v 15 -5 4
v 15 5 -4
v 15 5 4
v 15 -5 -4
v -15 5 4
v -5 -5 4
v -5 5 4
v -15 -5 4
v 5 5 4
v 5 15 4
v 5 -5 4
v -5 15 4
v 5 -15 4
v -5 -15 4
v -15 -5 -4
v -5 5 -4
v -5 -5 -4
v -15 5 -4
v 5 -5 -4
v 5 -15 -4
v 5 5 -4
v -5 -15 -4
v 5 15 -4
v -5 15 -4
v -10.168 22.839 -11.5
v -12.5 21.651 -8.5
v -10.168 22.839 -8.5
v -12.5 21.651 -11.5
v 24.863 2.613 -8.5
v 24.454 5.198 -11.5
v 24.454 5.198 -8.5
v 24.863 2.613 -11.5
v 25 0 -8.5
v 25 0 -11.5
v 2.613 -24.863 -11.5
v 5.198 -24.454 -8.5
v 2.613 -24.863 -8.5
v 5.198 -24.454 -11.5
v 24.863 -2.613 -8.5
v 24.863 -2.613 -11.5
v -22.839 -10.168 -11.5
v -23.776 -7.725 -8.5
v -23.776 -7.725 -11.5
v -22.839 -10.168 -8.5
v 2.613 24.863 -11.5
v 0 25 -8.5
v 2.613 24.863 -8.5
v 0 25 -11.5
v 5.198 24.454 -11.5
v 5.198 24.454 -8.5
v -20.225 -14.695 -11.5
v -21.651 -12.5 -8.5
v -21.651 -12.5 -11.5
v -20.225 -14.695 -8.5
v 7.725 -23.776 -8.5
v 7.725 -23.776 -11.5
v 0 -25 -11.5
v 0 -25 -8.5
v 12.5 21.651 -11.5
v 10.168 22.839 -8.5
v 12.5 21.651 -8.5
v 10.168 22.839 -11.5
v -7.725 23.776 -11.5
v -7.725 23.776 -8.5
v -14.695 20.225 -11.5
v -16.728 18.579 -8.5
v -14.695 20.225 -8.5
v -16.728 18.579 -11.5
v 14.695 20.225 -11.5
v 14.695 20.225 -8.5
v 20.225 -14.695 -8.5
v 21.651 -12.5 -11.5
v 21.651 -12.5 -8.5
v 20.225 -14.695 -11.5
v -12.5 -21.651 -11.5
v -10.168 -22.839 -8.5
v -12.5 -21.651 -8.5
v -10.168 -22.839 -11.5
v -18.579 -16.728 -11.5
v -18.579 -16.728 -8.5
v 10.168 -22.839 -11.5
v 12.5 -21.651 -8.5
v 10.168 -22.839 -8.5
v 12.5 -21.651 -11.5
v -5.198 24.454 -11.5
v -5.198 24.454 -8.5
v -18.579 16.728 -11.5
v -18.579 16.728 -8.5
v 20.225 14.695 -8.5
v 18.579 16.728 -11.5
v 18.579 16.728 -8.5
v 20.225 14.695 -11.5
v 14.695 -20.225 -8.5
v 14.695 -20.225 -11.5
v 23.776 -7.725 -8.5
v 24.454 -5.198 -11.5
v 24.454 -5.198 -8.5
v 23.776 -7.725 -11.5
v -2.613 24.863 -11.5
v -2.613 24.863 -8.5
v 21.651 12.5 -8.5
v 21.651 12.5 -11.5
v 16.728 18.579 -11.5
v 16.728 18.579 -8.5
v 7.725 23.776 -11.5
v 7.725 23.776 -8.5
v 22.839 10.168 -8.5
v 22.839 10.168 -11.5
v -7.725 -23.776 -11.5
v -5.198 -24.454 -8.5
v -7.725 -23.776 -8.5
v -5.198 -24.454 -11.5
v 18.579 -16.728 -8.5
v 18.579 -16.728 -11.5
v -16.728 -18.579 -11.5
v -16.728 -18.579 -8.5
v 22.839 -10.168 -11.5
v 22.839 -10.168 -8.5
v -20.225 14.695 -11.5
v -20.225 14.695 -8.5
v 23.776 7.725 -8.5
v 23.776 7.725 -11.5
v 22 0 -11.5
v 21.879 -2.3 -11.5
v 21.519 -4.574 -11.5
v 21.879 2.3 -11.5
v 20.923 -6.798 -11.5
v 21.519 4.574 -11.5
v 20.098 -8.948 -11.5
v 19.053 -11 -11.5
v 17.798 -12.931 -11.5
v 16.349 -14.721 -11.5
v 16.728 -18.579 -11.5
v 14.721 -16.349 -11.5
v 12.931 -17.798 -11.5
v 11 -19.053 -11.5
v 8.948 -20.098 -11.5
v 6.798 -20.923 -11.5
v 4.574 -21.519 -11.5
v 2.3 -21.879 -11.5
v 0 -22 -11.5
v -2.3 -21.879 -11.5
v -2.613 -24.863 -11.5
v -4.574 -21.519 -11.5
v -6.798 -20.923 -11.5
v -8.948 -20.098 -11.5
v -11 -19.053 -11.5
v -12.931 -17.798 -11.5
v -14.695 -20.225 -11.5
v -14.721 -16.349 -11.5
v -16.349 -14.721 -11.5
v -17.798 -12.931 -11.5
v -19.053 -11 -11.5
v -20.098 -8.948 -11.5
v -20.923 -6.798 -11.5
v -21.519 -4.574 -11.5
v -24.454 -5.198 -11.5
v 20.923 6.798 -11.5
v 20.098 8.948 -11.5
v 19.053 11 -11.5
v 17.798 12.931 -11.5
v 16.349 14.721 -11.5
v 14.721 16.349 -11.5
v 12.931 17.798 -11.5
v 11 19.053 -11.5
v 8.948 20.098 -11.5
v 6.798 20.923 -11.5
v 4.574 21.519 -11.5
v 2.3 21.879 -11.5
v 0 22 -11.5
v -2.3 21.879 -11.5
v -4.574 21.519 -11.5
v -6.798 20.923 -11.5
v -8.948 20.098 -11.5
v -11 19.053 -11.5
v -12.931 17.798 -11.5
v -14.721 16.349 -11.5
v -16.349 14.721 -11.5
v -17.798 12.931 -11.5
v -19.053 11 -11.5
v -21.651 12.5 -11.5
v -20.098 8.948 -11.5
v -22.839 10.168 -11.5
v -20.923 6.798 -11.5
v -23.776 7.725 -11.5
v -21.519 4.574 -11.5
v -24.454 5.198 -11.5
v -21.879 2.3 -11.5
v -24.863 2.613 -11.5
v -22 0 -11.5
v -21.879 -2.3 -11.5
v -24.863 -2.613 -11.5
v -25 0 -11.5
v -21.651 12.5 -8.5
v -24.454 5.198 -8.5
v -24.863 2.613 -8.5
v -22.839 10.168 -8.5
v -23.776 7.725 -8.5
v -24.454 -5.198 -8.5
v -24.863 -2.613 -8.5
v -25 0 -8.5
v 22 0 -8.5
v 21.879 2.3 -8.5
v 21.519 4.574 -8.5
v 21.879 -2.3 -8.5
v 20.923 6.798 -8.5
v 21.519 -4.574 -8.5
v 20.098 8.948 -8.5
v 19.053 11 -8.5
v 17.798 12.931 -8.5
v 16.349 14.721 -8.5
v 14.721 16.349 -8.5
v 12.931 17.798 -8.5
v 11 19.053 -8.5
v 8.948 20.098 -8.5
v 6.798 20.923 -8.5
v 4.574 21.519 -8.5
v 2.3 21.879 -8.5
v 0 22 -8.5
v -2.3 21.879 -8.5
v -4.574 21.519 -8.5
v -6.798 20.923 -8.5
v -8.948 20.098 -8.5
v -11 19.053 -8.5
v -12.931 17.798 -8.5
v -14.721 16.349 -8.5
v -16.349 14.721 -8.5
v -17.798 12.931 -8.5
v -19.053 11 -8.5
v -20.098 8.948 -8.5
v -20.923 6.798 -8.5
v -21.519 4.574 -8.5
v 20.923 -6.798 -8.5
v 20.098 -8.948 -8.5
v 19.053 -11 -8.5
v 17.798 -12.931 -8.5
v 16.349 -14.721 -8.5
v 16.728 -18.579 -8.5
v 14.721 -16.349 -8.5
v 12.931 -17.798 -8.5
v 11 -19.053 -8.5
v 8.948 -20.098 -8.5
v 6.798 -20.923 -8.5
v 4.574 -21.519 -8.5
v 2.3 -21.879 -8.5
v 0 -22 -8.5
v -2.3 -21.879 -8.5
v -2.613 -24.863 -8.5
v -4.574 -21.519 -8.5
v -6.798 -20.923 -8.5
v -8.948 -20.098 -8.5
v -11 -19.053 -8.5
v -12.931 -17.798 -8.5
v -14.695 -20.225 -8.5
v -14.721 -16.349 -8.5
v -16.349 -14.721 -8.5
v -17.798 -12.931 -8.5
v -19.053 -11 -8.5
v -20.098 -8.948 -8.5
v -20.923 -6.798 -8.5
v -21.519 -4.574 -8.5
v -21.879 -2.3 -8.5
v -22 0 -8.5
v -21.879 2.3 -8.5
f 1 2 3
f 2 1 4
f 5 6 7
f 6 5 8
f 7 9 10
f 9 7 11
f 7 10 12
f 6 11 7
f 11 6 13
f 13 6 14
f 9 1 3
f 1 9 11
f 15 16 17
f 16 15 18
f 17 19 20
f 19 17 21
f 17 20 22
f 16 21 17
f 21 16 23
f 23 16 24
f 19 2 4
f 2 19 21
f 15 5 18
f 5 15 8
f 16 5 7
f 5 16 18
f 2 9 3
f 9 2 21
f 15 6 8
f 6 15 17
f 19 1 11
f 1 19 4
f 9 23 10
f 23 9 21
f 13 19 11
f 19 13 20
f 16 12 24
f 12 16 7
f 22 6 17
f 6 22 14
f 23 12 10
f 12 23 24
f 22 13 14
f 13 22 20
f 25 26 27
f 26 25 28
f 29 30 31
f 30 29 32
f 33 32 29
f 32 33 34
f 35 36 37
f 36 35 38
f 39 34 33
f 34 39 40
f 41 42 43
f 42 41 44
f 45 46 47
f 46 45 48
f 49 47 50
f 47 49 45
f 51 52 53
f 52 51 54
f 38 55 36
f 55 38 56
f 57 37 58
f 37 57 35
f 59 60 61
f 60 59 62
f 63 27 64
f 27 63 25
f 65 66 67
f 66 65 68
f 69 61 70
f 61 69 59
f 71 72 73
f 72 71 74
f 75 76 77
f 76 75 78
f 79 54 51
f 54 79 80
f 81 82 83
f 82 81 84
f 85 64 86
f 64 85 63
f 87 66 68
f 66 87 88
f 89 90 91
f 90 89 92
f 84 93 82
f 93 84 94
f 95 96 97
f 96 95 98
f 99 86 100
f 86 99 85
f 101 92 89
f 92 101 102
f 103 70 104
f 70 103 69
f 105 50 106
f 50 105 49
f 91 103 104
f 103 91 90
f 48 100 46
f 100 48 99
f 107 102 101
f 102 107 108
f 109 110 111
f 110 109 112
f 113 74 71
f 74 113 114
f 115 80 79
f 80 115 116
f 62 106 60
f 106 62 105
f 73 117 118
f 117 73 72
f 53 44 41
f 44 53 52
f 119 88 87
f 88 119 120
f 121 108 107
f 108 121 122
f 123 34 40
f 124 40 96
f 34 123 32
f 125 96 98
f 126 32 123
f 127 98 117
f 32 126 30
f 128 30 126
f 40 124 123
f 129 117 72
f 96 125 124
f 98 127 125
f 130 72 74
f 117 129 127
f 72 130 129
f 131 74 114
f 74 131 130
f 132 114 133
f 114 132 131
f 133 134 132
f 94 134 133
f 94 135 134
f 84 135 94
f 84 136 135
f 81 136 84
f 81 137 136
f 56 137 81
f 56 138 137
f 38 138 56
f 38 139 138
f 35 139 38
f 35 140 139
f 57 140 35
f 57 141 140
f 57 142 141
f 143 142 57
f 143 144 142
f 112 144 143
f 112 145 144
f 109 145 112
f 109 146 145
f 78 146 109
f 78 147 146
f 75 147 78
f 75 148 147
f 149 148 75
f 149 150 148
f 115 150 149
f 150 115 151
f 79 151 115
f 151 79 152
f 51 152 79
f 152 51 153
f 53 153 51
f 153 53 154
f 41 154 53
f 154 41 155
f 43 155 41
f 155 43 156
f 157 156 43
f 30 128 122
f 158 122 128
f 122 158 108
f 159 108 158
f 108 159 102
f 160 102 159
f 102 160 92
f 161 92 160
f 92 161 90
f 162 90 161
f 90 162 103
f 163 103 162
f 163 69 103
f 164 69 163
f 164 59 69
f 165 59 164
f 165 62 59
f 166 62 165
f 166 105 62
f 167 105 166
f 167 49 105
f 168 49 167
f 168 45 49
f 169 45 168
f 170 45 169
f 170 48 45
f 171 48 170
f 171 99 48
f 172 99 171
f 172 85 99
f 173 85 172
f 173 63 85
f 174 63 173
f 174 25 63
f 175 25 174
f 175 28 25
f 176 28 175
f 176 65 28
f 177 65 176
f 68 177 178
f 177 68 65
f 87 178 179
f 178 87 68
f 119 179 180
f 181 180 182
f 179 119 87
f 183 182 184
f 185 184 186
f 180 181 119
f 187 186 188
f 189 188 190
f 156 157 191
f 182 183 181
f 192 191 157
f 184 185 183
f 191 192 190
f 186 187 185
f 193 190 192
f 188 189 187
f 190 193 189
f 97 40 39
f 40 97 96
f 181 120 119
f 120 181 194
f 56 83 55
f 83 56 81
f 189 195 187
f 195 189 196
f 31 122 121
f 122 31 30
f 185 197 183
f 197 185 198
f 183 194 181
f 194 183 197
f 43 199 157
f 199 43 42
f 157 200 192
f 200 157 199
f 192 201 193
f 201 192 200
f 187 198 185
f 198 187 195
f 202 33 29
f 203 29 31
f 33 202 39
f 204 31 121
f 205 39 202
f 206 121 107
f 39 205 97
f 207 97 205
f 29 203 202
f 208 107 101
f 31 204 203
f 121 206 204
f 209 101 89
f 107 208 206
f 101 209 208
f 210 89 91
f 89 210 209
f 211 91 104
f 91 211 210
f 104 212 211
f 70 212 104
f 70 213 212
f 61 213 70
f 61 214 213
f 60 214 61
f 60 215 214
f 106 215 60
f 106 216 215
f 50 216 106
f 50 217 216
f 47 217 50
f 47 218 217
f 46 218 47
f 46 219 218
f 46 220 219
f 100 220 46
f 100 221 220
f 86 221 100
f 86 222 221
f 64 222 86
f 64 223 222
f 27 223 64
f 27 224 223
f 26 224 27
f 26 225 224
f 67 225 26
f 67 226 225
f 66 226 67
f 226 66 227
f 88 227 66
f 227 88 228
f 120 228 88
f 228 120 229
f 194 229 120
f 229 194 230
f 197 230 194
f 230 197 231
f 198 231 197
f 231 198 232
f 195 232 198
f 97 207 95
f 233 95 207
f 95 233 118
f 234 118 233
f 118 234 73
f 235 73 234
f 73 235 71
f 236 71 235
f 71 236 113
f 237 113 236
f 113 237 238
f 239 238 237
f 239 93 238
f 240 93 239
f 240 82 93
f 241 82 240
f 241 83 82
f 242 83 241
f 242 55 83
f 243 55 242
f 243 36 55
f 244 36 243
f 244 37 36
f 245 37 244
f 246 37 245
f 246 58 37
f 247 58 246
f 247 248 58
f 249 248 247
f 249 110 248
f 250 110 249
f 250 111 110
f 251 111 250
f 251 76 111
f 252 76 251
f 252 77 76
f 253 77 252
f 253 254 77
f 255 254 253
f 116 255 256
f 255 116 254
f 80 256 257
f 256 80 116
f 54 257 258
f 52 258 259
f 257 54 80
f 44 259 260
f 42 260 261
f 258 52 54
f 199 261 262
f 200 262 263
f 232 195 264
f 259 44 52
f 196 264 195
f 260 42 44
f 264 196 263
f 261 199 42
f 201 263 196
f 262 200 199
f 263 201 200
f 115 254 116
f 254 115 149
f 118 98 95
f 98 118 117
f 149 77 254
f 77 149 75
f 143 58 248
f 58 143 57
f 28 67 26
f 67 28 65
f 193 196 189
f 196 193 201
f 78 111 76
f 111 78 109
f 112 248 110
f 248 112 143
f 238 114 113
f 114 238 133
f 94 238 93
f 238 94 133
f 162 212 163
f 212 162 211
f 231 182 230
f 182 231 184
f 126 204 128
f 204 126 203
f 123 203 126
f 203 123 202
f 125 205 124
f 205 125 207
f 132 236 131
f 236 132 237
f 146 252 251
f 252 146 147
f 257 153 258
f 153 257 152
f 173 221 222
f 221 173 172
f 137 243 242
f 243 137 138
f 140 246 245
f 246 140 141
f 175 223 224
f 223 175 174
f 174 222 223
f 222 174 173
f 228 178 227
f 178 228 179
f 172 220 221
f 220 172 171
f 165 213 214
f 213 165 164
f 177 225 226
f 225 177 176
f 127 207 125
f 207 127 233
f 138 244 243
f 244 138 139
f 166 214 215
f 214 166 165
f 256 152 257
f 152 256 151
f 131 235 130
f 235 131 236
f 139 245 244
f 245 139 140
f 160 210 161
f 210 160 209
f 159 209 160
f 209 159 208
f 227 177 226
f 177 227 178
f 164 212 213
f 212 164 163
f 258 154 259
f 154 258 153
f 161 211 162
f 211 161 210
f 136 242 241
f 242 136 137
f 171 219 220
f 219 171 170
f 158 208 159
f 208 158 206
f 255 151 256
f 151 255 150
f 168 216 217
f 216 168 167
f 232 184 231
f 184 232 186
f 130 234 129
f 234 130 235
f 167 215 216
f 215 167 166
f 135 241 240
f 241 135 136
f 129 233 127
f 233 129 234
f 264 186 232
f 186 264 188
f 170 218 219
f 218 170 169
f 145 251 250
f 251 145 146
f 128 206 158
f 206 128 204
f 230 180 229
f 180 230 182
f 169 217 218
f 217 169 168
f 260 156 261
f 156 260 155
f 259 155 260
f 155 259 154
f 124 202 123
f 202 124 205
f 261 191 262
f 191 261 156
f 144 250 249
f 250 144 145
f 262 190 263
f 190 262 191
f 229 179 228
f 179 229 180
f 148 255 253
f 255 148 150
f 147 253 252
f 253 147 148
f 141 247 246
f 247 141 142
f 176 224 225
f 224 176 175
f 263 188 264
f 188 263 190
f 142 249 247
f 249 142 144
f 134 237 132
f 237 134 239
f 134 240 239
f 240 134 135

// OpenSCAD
// ==========================================================================
// POWERED SMART HOSPITAL (PSH) - PARAMETRIC OPENSCAD SOURCE MODELS
// ==========================================================================

$fn = 60;

// 1. Parametric 3D Medical Cross Emblem
module medical_cross(size=20, depth=5) {
    union() {
        cube([size, size/3, depth], center=true);
        cube([size/3, size, depth], center=true);
    }
}

// 2. Queue Token Node Ring
module queue_token_ring(radius=15, thickness=2) {
    difference() {
        cylinder(r=radius, h=thickness, center=true);
        cylinder(r=radius-thickness, h=thickness+1, center=true);
    }
}

// Render Default Assembly
translate([0, 0, 0]) medical_cross(30, 8);
translate([0, 0, -10]) queue_token_ring(25, 3);
